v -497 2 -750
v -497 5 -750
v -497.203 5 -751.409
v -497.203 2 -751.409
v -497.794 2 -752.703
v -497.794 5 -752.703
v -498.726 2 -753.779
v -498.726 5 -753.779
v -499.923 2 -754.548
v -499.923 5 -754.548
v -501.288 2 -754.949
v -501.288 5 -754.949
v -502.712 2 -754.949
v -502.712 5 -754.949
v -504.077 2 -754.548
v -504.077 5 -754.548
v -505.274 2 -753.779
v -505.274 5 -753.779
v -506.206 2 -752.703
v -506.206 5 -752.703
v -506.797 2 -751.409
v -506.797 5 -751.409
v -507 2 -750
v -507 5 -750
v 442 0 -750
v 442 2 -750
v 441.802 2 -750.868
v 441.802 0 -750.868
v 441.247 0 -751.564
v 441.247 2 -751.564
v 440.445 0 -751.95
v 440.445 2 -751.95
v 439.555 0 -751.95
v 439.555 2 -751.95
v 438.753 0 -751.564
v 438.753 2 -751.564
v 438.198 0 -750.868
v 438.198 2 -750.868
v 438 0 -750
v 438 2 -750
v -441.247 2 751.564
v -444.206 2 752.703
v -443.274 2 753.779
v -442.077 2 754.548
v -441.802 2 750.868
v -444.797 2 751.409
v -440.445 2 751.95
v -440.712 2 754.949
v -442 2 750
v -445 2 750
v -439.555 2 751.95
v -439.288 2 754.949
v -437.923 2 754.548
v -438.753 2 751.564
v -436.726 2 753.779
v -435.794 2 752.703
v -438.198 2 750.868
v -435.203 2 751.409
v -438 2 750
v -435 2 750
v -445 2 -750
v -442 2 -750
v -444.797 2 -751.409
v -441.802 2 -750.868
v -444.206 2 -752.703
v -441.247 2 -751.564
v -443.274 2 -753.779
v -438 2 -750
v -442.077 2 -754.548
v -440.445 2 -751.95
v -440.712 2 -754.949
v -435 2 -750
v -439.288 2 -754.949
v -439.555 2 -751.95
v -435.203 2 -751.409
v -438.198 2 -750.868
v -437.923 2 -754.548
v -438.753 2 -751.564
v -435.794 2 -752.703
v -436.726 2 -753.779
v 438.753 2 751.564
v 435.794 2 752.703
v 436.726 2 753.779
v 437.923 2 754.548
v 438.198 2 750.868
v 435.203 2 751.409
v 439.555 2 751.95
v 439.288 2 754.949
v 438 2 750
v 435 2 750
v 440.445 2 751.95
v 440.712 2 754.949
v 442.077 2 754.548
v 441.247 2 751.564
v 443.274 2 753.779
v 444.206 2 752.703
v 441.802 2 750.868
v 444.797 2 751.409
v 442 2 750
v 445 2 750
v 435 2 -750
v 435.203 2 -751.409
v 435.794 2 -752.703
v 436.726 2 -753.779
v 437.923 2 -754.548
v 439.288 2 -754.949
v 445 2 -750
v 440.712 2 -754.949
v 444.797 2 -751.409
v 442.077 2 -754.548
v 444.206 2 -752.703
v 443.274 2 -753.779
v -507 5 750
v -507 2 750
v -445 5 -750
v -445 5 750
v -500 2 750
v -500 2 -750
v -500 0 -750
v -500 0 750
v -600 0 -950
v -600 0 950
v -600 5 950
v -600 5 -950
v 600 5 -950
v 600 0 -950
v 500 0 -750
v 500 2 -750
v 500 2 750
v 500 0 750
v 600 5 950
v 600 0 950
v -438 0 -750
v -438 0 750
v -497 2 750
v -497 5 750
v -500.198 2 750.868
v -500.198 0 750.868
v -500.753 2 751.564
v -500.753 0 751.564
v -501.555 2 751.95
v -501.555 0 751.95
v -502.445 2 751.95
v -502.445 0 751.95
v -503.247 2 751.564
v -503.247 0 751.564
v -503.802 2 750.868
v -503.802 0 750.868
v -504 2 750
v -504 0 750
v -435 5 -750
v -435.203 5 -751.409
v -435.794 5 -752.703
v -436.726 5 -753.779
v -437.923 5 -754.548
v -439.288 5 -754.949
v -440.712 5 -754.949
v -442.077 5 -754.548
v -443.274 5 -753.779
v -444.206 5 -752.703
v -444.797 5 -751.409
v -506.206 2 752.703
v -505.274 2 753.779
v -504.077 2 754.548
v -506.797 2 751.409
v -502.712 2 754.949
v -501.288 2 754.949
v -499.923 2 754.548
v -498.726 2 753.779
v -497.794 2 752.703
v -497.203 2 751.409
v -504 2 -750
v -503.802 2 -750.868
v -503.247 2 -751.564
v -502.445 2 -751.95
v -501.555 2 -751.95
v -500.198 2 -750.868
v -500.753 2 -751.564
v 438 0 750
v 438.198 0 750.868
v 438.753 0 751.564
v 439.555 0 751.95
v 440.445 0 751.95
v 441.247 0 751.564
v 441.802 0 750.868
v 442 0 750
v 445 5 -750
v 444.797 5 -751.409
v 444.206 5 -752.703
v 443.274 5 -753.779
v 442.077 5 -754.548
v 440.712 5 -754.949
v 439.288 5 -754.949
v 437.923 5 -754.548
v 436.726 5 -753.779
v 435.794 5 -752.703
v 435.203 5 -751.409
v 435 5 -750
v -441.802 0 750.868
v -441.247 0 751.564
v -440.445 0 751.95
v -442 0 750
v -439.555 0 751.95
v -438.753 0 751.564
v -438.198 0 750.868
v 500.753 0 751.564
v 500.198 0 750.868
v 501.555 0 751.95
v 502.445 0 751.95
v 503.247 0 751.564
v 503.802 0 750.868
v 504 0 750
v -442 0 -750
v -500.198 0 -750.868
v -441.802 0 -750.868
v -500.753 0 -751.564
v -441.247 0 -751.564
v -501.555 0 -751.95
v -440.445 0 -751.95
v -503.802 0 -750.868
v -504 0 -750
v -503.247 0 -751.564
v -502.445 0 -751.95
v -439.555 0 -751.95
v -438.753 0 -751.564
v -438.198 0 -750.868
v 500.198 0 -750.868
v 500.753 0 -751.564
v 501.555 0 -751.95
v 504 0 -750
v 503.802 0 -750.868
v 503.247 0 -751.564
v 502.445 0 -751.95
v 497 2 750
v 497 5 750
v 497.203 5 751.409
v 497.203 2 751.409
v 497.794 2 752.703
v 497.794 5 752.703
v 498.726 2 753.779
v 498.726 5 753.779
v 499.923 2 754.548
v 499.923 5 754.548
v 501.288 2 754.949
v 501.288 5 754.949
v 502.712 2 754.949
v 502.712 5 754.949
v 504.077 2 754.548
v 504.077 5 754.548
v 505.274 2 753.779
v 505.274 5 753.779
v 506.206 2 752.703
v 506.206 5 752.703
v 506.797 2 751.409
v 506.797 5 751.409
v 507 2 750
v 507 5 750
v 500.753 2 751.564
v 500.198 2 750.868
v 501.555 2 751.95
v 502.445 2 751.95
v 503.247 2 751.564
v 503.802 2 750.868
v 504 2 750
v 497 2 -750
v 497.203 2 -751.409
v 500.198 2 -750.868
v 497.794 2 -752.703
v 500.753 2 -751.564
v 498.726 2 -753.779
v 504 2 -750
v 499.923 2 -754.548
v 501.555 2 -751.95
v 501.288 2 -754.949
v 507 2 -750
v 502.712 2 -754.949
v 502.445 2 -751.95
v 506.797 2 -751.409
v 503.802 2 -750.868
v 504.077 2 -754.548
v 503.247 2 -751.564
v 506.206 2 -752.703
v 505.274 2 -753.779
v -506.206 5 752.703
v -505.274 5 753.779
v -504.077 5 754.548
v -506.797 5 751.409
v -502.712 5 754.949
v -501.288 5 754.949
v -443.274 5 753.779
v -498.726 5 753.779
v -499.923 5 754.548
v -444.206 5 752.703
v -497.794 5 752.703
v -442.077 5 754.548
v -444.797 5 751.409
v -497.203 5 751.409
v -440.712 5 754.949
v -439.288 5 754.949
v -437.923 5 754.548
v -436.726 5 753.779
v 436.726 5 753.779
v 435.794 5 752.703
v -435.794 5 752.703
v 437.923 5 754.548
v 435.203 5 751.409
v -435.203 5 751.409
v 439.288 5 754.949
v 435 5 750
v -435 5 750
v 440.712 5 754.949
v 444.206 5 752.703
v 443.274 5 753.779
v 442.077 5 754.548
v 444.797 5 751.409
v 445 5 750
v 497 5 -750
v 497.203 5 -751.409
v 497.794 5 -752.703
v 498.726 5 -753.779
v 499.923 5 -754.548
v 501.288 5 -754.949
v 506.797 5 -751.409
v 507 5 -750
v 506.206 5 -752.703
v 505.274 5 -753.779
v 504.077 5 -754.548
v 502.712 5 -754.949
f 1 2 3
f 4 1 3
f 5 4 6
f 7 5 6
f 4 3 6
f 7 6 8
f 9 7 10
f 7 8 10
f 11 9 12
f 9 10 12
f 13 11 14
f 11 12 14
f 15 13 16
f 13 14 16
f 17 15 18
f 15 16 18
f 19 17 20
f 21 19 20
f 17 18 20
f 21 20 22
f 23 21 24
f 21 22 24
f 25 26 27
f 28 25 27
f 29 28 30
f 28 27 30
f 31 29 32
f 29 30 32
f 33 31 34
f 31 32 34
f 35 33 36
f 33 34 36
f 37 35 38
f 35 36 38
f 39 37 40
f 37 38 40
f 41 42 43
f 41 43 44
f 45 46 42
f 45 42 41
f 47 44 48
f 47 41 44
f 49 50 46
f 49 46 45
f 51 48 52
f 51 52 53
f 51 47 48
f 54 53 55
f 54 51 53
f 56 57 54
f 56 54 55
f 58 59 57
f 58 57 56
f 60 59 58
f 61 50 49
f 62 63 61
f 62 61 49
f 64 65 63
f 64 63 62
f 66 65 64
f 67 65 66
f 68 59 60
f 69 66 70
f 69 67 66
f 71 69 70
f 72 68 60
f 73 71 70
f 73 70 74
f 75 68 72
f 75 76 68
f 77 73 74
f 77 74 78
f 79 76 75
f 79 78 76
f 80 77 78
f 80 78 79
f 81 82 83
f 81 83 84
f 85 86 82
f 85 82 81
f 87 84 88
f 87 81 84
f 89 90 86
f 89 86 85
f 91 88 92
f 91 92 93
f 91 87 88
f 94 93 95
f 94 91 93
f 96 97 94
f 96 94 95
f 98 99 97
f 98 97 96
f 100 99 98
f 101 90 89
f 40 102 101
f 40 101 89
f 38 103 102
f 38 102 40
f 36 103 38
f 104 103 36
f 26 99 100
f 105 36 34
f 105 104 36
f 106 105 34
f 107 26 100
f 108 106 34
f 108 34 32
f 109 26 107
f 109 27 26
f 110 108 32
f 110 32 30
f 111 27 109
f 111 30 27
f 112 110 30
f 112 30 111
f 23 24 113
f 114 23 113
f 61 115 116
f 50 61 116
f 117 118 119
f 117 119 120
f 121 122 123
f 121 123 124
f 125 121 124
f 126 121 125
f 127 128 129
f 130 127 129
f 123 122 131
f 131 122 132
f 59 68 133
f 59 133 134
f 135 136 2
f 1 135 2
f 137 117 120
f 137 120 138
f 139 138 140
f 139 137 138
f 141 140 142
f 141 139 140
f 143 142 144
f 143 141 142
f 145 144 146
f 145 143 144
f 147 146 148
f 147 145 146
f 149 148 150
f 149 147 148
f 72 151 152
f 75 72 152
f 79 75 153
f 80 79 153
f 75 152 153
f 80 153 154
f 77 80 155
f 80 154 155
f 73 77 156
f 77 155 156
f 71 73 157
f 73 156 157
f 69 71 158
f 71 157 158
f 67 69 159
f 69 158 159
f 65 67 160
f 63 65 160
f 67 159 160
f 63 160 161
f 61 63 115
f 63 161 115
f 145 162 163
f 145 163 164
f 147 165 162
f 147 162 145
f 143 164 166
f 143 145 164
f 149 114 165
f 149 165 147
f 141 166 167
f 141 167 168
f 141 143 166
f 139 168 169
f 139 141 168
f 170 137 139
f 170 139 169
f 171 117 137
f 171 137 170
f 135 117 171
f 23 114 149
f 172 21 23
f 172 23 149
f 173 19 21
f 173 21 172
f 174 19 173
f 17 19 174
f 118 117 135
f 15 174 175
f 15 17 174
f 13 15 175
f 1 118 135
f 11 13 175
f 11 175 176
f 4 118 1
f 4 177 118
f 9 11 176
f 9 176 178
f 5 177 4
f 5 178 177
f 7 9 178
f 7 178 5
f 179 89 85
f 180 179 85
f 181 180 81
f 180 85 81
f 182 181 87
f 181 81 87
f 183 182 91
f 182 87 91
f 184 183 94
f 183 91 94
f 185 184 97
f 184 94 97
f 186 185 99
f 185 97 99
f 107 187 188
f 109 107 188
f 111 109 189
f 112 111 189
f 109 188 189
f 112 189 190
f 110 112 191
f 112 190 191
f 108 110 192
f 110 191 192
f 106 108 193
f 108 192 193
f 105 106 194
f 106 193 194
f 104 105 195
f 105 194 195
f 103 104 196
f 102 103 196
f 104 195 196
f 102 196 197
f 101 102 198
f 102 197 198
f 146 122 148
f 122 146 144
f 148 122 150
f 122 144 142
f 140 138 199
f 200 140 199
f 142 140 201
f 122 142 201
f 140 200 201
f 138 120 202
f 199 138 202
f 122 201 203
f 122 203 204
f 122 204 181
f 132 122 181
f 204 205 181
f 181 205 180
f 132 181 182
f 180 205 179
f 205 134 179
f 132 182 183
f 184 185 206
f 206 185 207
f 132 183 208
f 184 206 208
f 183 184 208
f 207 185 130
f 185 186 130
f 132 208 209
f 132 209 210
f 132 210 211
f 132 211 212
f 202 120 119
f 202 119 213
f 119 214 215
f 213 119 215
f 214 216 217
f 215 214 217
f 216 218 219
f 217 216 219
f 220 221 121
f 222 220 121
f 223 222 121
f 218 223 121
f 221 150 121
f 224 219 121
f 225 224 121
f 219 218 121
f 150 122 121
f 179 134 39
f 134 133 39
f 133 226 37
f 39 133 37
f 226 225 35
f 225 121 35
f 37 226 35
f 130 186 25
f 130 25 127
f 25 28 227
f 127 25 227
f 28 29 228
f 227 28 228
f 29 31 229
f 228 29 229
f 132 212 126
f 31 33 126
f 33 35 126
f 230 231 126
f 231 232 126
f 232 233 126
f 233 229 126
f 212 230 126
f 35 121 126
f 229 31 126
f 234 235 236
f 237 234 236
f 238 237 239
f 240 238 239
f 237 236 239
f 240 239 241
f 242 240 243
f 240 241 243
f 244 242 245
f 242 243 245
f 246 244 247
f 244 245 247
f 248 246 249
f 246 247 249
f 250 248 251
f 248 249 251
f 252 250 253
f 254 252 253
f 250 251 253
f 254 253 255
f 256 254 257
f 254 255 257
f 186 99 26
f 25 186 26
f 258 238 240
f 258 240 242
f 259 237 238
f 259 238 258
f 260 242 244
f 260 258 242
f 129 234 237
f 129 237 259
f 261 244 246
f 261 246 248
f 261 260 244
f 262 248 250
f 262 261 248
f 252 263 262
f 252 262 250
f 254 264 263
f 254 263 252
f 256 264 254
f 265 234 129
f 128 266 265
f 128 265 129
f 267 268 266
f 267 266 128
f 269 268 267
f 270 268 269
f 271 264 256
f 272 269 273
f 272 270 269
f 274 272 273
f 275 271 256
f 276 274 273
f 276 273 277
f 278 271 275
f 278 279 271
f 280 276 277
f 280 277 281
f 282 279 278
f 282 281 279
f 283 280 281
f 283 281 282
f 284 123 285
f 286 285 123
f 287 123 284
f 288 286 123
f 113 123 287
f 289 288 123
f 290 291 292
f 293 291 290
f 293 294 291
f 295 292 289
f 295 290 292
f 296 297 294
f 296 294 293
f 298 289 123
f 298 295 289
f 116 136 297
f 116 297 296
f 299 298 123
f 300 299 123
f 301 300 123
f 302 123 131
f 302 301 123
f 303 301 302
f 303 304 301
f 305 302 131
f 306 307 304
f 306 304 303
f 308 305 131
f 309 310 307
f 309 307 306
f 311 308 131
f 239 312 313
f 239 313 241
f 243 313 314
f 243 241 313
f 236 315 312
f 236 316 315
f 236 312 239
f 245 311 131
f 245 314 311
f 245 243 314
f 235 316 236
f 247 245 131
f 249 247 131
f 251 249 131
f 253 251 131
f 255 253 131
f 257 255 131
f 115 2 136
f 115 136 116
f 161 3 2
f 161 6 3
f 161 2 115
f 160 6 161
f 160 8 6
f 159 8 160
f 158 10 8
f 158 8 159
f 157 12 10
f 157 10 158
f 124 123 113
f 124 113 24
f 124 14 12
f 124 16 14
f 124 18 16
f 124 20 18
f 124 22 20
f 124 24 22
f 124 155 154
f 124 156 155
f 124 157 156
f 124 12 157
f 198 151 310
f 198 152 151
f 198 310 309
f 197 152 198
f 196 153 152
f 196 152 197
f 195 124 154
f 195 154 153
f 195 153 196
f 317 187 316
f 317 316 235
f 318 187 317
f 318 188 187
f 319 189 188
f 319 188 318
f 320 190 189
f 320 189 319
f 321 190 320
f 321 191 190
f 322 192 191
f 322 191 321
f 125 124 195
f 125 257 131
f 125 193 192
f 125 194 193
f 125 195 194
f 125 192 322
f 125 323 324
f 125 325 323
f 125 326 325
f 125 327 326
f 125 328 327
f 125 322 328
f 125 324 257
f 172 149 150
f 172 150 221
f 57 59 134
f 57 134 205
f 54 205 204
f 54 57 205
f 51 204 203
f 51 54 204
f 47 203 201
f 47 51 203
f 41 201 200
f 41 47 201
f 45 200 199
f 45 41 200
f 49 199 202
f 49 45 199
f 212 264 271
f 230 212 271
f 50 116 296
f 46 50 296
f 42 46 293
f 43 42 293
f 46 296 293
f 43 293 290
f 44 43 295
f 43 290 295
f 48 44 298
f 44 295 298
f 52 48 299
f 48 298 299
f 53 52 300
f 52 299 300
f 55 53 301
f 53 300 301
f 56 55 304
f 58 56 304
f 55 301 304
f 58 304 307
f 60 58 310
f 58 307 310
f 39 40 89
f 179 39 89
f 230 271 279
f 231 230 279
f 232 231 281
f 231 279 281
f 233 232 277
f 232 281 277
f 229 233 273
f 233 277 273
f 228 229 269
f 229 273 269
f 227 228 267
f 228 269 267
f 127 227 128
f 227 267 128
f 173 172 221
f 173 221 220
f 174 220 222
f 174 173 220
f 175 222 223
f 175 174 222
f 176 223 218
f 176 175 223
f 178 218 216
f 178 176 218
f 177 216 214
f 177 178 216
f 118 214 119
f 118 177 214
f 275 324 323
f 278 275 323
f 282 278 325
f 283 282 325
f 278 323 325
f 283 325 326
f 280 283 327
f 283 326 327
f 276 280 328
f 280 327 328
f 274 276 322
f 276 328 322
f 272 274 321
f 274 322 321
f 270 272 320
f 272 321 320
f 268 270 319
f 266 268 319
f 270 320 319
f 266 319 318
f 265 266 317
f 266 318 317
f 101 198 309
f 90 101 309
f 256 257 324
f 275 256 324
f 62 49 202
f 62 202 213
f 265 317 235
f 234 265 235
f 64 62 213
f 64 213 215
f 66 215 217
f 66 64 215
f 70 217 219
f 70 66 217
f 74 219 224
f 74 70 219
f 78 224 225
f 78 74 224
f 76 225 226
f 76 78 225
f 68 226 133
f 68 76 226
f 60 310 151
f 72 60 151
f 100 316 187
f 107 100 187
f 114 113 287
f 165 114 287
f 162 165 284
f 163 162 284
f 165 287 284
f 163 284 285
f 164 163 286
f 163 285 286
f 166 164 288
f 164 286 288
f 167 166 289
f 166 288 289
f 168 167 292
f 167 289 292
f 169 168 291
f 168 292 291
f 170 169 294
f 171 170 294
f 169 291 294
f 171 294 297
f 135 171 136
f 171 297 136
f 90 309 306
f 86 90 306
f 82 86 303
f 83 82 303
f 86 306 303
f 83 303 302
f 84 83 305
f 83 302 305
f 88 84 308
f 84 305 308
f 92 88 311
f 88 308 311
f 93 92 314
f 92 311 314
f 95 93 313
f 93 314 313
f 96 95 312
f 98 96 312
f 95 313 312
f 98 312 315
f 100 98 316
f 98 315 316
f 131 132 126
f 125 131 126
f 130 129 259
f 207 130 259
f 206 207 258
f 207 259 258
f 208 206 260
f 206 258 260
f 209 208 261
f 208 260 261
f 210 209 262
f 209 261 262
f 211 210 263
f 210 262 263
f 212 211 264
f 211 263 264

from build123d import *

# Parameters (mm, degrees)
SKETCH1_W           = 1200
SKETCH1_H           = 1900
BOSS_EXTRUDE1_DEPTH = 5
CUT_EXTRUDE1_DEPTH  = 5
CUT_EXTRUDE2_DEPTH  = 3


with BuildPart() as part:
    # Sketch1 → Boss-Extrude1 (new body)
    with BuildSketch(Plane(origin=(0, 0, 0), x_dir=(1, 0, 0), z_dir=(0, 1, 0))):
        Rectangle(SKETCH1_W, SKETCH1_H)
    extrude(amount=BOSS_EXTRUDE1_DEPTH)

    # Sketch2 → Cut-Extrude1 (cut)
    with BuildSketch(Plane(origin=(0, 5, 0), x_dir=(1, 0, 0), z_dir=(0, 1, 0))):
        with BuildLine():
            Line((-500, 750), (-500, -750))
            ThreePointArc((-500, -750), (-502, -752), (-504, -750))
            Line((-504, -750), (-504, 750))
            ThreePointArc((-504, 750), (-502, 752), (-500, 750))
        make_face()
        with BuildLine():
            Line((-438, 750), (-438, -750))
            ThreePointArc((-438, -750), (-440, -752), (-442, -750))
            Line((-442, -750), (-442, 750))
            ThreePointArc((-442, 750), (-440, 752), (-438, 750))
        make_face()
        with BuildLine():
            Line((438, 750), (438, -750))
            ThreePointArc((438, -750), (440, -752), (442, -750))
            Line((442, -750), (442, 750))
            ThreePointArc((442, 750), (440, 752), (438, 750))
        make_face()
        with BuildLine():
            Line((500, 750), (500, -750))
            ThreePointArc((500, -750), (502, -752), (504, -750))
            Line((504, -750), (504, 750))
            ThreePointArc((504, 750), (502, 752), (500, 750))
        make_face()
    extrude(amount=-CUT_EXTRUDE1_DEPTH, mode=Mode.SUBTRACT)

    # Sketch4 → Cut-Extrude2 (cut)
    # profile 1 of 4: a face of its own
    with BuildSketch(Plane(origin=(0, 5, 0), x_dir=(1, 0, 0), z_dir=(0, 1, 0))):
        with BuildLine():
            Line((-435, -750), (-435, 750))
            ThreePointArc((-435, 750), (-440, 755), (-445, 750))
            Line((-445, 750), (-445, -750))
            ThreePointArc((-445, -750), (-440, -755), (-435, -750))
        make_face()
        with BuildLine():
            Line((-438, -750), (-438, 750))
            ThreePointArc((-438, 750), (-440, 752), (-442, 750))
            Line((-442, 750), (-442, -750))
            ThreePointArc((-442, -750), (-440, -752), (-438, -750))
        make_face(mode=Mode.SUBTRACT)
    # profile 2 of 4: a face of its own
    with BuildSketch(Plane(origin=(0, 5, 0), x_dir=(1, 0, 0), z_dir=(0, 1, 0))):
        with BuildLine():
            Line((-497, -750), (-497, 750))
            ThreePointArc((-497, 750), (-502, 755), (-507, 750))
            Line((-507, 750), (-507, -750))
            ThreePointArc((-507, -750), (-502, -755), (-497, -750))
        make_face()
        with BuildLine():
            Line((-500, -750), (-500, 750))
            ThreePointArc((-500, 750), (-502, 752), (-504, 750))
            Line((-504, 750), (-504, -750))
            ThreePointArc((-504, -750), (-502, -752), (-500, -750))
        make_face(mode=Mode.SUBTRACT)
    # profile 3 of 4: a face of its own
    with BuildSketch(Plane(origin=(0, 5, 0), x_dir=(1, 0, 0), z_dir=(0, 1, 0))):
        with BuildLine():
            Line((497, 750), (497, -750))
            ThreePointArc((497, -750), (502, -755), (507, -750))
            Line((507, -750), (507, 750))
            ThreePointArc((507, 750), (502, 755), (497, 750))
        make_face()
        with BuildLine():
            Line((500, 750), (500, -750))
            ThreePointArc((500, -750), (502, -752), (504, -750))
            Line((504, -750), (504, 750))
            ThreePointArc((504, 750), (502, 752), (500, 750))
        make_face(mode=Mode.SUBTRACT)
    # profile 4 of 4: a face of its own
    with BuildSketch(Plane(origin=(0, 5, 0), x_dir=(1, 0, 0), z_dir=(0, 1, 0))):
        with BuildLine():
            Line((435, 750), (435, -750))
            ThreePointArc((435, -750), (440, -755), (445, -750))
            Line((445, -750), (445, 750))
            ThreePointArc((445, 750), (440, 755), (435, 750))
        make_face()
        with BuildLine():
            Line((438, 750), (438, -750))
            ThreePointArc((438, -750), (440, -752), (442, -750))
            Line((442, -750), (442, 750))
            ThreePointArc((442, 750), (440, 752), (438, 750))
        make_face(mode=Mode.SUBTRACT)
    extrude(amount=-CUT_EXTRUDE2_DEPTH, mode=Mode.SUBTRACT)


solid = part.part
